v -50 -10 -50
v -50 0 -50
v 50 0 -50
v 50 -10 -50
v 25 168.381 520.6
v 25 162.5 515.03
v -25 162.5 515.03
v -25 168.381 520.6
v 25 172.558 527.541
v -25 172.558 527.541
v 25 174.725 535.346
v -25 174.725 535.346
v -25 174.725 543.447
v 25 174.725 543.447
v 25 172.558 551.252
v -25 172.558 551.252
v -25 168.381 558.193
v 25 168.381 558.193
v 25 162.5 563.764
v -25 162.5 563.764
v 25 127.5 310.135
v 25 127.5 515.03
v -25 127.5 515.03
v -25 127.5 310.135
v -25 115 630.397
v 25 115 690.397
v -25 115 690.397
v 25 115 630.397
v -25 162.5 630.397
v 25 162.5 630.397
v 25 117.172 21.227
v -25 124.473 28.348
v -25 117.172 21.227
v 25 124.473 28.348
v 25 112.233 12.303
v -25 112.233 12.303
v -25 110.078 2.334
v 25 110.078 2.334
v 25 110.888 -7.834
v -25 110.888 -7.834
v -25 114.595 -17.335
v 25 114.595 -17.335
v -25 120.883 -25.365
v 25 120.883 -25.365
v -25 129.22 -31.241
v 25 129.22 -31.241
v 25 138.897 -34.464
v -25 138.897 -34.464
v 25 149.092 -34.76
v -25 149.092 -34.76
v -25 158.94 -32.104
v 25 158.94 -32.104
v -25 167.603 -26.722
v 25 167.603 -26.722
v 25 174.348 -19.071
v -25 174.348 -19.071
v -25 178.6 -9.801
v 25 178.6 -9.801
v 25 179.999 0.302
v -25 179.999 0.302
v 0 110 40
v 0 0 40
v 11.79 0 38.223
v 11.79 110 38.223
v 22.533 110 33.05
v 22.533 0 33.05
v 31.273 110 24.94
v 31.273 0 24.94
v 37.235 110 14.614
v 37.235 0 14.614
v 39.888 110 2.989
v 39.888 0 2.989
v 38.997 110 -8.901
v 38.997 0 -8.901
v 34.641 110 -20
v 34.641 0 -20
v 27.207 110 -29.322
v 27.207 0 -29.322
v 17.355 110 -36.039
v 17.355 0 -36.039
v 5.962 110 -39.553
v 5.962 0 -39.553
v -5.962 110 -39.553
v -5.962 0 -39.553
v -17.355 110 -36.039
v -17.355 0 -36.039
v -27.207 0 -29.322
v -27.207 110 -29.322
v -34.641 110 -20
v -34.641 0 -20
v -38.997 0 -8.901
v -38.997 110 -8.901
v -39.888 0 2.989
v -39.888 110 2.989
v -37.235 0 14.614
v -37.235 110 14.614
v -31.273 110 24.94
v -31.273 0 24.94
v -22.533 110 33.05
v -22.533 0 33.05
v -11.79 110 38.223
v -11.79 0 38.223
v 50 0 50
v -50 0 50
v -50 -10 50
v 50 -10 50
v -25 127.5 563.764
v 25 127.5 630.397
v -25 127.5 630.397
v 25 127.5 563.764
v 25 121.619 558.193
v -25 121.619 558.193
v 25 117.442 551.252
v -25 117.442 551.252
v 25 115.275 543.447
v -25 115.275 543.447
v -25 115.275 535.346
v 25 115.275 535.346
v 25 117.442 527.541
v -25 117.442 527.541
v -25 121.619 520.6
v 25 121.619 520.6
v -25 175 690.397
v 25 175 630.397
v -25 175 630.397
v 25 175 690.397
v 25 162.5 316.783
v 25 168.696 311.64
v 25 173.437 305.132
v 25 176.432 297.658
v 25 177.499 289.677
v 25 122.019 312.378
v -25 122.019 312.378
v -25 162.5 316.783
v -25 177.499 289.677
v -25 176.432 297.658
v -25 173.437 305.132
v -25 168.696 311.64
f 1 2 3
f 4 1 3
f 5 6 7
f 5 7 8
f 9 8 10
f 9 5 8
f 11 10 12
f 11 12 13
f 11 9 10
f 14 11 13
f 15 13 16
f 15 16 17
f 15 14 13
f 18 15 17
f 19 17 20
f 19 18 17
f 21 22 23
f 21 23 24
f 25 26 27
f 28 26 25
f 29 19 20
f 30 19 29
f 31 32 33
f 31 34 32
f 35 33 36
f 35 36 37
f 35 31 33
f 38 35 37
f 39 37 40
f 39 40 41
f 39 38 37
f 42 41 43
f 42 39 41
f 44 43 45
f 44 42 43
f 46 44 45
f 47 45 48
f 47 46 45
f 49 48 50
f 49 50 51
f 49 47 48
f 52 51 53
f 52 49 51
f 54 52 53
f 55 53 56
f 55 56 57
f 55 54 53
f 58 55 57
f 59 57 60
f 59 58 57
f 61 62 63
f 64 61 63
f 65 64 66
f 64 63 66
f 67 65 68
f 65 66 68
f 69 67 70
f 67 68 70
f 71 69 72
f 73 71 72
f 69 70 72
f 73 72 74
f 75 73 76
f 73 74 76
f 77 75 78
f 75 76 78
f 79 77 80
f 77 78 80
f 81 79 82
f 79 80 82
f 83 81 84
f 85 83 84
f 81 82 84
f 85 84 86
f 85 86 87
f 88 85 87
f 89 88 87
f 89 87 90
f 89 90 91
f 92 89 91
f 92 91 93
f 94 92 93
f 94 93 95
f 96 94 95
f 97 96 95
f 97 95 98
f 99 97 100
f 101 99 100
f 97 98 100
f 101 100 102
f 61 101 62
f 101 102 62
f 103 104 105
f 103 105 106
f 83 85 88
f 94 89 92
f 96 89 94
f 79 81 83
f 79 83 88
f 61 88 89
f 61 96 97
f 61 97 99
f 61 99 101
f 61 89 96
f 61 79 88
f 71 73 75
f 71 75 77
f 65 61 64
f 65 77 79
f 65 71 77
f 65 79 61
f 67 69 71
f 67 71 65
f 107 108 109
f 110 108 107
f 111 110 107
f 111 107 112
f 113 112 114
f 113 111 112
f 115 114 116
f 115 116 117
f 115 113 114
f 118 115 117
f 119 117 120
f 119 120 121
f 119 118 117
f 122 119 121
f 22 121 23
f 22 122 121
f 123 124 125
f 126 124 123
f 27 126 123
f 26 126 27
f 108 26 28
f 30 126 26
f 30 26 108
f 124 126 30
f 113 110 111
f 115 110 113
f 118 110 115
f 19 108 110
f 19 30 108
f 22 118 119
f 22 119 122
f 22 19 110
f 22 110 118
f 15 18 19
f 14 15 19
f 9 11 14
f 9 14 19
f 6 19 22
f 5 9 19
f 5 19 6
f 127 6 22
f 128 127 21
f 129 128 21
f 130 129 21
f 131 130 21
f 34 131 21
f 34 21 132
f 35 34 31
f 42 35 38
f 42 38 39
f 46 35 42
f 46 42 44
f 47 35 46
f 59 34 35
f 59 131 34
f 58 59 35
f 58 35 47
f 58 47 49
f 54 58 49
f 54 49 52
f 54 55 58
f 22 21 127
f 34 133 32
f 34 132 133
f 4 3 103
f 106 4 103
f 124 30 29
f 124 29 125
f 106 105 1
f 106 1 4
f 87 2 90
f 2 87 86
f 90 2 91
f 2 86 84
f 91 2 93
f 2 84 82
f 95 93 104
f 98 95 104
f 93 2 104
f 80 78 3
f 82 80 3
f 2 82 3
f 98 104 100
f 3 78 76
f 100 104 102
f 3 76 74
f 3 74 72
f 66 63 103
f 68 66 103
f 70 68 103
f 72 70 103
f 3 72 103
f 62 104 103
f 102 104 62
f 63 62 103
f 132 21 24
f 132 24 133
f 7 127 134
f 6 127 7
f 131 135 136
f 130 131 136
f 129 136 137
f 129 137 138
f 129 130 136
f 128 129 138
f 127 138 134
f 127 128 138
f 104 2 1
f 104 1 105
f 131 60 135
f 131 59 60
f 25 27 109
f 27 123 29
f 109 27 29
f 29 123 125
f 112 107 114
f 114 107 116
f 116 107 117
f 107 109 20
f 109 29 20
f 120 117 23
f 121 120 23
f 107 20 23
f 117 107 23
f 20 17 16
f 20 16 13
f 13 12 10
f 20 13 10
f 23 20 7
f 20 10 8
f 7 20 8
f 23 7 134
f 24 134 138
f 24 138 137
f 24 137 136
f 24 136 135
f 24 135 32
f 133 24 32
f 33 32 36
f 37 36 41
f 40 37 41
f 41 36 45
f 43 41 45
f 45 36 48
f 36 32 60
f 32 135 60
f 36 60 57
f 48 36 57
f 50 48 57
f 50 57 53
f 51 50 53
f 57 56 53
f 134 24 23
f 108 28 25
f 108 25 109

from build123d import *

# Parameters (mm, degrees)
SKETCH1_R           = 40
BOSS_EXTRUDE1_DEPTH = 110
SKETCH2_W           = 100
SKETCH2_H           = 100
BOSS_EXTRUDE2_DEPTH = 10
BOSS_EXTRUDE3_DEPTH = 25


with BuildPart() as part:
    # Sketch1 → Boss-Extrude1 (new body)
    with BuildSketch(Plane(origin=(0, 0, 0), x_dir=(1, 0, 0), z_dir=(0, 1, 0))):
        with Locations(Location((0, 0, 0), (0, 0, 270))):
            Circle(SKETCH1_R)
    extrude(amount=BOSS_EXTRUDE1_DEPTH)

    # Sketch2 → Boss-Extrude2 (add)
    with BuildSketch(Plane.XZ):
        Rectangle(SKETCH2_W, SKETCH2_H)
    extrude(amount=BOSS_EXTRUDE2_DEPTH)


with BuildPart() as body_2:
    # Sketch3 → Boss-Extrude3 (new, symmetric)
    with BuildSketch(Plane(origin=(0, 0, 0), x_dir=(0, 0, -1), z_dir=(1, 0, 0))):
        with BuildLine():
            Line((-0.302353258, 179.998694011), (-289.677340984, 177.498787296))
            ThreePointArc((-289.677340984, 177.498787296), (-305.132054802, 173.436683541), (-316.782712263, 162.5))
            Line((-316.782712263, 162.5), (-515.029598525, 162.5))
            ThreePointArc((-515.029598525, 162.5), (-539.396584387, 175), (-563.763570249, 162.5))
            Line((-563.763570249, 162.5), (-630.396584387, 162.5))
            Line((-630.396584387, 162.5), (-630.396584387, 175))
            Line((-630.396584387, 175), (-690.396584387, 175))
            Line((-690.396584387, 175), (-690.396584387, 115))
            Line((-690.396584387, 115), (-630.396584387, 115))
            Line((-630.396584387, 115), (-630.396584387, 127.5))
            Line((-630.396584387, 127.5), (-563.763570249, 127.5))
            ThreePointArc((-563.763570249, 127.5), (-539.396584387, 115), (-515.029598525, 127.5))
            Line((-515.029598525, 127.5), (-310.134949458, 127.5))
            Line((-310.134949458, 127.5), (-312.377554776, 122.019029611))
            Line((-312.377554776, 122.019029611), (-28.348406637, 124.472753689))
            ThreePointArc((-28.348406637, 124.472753689), (31.240983064, 129.220235199), (-0.302353258, 179.998694011))
        make_face()
    extrude(amount=BOSS_EXTRUDE3_DEPTH, both=True)


solid = Compound([part.part, body_2.part])
